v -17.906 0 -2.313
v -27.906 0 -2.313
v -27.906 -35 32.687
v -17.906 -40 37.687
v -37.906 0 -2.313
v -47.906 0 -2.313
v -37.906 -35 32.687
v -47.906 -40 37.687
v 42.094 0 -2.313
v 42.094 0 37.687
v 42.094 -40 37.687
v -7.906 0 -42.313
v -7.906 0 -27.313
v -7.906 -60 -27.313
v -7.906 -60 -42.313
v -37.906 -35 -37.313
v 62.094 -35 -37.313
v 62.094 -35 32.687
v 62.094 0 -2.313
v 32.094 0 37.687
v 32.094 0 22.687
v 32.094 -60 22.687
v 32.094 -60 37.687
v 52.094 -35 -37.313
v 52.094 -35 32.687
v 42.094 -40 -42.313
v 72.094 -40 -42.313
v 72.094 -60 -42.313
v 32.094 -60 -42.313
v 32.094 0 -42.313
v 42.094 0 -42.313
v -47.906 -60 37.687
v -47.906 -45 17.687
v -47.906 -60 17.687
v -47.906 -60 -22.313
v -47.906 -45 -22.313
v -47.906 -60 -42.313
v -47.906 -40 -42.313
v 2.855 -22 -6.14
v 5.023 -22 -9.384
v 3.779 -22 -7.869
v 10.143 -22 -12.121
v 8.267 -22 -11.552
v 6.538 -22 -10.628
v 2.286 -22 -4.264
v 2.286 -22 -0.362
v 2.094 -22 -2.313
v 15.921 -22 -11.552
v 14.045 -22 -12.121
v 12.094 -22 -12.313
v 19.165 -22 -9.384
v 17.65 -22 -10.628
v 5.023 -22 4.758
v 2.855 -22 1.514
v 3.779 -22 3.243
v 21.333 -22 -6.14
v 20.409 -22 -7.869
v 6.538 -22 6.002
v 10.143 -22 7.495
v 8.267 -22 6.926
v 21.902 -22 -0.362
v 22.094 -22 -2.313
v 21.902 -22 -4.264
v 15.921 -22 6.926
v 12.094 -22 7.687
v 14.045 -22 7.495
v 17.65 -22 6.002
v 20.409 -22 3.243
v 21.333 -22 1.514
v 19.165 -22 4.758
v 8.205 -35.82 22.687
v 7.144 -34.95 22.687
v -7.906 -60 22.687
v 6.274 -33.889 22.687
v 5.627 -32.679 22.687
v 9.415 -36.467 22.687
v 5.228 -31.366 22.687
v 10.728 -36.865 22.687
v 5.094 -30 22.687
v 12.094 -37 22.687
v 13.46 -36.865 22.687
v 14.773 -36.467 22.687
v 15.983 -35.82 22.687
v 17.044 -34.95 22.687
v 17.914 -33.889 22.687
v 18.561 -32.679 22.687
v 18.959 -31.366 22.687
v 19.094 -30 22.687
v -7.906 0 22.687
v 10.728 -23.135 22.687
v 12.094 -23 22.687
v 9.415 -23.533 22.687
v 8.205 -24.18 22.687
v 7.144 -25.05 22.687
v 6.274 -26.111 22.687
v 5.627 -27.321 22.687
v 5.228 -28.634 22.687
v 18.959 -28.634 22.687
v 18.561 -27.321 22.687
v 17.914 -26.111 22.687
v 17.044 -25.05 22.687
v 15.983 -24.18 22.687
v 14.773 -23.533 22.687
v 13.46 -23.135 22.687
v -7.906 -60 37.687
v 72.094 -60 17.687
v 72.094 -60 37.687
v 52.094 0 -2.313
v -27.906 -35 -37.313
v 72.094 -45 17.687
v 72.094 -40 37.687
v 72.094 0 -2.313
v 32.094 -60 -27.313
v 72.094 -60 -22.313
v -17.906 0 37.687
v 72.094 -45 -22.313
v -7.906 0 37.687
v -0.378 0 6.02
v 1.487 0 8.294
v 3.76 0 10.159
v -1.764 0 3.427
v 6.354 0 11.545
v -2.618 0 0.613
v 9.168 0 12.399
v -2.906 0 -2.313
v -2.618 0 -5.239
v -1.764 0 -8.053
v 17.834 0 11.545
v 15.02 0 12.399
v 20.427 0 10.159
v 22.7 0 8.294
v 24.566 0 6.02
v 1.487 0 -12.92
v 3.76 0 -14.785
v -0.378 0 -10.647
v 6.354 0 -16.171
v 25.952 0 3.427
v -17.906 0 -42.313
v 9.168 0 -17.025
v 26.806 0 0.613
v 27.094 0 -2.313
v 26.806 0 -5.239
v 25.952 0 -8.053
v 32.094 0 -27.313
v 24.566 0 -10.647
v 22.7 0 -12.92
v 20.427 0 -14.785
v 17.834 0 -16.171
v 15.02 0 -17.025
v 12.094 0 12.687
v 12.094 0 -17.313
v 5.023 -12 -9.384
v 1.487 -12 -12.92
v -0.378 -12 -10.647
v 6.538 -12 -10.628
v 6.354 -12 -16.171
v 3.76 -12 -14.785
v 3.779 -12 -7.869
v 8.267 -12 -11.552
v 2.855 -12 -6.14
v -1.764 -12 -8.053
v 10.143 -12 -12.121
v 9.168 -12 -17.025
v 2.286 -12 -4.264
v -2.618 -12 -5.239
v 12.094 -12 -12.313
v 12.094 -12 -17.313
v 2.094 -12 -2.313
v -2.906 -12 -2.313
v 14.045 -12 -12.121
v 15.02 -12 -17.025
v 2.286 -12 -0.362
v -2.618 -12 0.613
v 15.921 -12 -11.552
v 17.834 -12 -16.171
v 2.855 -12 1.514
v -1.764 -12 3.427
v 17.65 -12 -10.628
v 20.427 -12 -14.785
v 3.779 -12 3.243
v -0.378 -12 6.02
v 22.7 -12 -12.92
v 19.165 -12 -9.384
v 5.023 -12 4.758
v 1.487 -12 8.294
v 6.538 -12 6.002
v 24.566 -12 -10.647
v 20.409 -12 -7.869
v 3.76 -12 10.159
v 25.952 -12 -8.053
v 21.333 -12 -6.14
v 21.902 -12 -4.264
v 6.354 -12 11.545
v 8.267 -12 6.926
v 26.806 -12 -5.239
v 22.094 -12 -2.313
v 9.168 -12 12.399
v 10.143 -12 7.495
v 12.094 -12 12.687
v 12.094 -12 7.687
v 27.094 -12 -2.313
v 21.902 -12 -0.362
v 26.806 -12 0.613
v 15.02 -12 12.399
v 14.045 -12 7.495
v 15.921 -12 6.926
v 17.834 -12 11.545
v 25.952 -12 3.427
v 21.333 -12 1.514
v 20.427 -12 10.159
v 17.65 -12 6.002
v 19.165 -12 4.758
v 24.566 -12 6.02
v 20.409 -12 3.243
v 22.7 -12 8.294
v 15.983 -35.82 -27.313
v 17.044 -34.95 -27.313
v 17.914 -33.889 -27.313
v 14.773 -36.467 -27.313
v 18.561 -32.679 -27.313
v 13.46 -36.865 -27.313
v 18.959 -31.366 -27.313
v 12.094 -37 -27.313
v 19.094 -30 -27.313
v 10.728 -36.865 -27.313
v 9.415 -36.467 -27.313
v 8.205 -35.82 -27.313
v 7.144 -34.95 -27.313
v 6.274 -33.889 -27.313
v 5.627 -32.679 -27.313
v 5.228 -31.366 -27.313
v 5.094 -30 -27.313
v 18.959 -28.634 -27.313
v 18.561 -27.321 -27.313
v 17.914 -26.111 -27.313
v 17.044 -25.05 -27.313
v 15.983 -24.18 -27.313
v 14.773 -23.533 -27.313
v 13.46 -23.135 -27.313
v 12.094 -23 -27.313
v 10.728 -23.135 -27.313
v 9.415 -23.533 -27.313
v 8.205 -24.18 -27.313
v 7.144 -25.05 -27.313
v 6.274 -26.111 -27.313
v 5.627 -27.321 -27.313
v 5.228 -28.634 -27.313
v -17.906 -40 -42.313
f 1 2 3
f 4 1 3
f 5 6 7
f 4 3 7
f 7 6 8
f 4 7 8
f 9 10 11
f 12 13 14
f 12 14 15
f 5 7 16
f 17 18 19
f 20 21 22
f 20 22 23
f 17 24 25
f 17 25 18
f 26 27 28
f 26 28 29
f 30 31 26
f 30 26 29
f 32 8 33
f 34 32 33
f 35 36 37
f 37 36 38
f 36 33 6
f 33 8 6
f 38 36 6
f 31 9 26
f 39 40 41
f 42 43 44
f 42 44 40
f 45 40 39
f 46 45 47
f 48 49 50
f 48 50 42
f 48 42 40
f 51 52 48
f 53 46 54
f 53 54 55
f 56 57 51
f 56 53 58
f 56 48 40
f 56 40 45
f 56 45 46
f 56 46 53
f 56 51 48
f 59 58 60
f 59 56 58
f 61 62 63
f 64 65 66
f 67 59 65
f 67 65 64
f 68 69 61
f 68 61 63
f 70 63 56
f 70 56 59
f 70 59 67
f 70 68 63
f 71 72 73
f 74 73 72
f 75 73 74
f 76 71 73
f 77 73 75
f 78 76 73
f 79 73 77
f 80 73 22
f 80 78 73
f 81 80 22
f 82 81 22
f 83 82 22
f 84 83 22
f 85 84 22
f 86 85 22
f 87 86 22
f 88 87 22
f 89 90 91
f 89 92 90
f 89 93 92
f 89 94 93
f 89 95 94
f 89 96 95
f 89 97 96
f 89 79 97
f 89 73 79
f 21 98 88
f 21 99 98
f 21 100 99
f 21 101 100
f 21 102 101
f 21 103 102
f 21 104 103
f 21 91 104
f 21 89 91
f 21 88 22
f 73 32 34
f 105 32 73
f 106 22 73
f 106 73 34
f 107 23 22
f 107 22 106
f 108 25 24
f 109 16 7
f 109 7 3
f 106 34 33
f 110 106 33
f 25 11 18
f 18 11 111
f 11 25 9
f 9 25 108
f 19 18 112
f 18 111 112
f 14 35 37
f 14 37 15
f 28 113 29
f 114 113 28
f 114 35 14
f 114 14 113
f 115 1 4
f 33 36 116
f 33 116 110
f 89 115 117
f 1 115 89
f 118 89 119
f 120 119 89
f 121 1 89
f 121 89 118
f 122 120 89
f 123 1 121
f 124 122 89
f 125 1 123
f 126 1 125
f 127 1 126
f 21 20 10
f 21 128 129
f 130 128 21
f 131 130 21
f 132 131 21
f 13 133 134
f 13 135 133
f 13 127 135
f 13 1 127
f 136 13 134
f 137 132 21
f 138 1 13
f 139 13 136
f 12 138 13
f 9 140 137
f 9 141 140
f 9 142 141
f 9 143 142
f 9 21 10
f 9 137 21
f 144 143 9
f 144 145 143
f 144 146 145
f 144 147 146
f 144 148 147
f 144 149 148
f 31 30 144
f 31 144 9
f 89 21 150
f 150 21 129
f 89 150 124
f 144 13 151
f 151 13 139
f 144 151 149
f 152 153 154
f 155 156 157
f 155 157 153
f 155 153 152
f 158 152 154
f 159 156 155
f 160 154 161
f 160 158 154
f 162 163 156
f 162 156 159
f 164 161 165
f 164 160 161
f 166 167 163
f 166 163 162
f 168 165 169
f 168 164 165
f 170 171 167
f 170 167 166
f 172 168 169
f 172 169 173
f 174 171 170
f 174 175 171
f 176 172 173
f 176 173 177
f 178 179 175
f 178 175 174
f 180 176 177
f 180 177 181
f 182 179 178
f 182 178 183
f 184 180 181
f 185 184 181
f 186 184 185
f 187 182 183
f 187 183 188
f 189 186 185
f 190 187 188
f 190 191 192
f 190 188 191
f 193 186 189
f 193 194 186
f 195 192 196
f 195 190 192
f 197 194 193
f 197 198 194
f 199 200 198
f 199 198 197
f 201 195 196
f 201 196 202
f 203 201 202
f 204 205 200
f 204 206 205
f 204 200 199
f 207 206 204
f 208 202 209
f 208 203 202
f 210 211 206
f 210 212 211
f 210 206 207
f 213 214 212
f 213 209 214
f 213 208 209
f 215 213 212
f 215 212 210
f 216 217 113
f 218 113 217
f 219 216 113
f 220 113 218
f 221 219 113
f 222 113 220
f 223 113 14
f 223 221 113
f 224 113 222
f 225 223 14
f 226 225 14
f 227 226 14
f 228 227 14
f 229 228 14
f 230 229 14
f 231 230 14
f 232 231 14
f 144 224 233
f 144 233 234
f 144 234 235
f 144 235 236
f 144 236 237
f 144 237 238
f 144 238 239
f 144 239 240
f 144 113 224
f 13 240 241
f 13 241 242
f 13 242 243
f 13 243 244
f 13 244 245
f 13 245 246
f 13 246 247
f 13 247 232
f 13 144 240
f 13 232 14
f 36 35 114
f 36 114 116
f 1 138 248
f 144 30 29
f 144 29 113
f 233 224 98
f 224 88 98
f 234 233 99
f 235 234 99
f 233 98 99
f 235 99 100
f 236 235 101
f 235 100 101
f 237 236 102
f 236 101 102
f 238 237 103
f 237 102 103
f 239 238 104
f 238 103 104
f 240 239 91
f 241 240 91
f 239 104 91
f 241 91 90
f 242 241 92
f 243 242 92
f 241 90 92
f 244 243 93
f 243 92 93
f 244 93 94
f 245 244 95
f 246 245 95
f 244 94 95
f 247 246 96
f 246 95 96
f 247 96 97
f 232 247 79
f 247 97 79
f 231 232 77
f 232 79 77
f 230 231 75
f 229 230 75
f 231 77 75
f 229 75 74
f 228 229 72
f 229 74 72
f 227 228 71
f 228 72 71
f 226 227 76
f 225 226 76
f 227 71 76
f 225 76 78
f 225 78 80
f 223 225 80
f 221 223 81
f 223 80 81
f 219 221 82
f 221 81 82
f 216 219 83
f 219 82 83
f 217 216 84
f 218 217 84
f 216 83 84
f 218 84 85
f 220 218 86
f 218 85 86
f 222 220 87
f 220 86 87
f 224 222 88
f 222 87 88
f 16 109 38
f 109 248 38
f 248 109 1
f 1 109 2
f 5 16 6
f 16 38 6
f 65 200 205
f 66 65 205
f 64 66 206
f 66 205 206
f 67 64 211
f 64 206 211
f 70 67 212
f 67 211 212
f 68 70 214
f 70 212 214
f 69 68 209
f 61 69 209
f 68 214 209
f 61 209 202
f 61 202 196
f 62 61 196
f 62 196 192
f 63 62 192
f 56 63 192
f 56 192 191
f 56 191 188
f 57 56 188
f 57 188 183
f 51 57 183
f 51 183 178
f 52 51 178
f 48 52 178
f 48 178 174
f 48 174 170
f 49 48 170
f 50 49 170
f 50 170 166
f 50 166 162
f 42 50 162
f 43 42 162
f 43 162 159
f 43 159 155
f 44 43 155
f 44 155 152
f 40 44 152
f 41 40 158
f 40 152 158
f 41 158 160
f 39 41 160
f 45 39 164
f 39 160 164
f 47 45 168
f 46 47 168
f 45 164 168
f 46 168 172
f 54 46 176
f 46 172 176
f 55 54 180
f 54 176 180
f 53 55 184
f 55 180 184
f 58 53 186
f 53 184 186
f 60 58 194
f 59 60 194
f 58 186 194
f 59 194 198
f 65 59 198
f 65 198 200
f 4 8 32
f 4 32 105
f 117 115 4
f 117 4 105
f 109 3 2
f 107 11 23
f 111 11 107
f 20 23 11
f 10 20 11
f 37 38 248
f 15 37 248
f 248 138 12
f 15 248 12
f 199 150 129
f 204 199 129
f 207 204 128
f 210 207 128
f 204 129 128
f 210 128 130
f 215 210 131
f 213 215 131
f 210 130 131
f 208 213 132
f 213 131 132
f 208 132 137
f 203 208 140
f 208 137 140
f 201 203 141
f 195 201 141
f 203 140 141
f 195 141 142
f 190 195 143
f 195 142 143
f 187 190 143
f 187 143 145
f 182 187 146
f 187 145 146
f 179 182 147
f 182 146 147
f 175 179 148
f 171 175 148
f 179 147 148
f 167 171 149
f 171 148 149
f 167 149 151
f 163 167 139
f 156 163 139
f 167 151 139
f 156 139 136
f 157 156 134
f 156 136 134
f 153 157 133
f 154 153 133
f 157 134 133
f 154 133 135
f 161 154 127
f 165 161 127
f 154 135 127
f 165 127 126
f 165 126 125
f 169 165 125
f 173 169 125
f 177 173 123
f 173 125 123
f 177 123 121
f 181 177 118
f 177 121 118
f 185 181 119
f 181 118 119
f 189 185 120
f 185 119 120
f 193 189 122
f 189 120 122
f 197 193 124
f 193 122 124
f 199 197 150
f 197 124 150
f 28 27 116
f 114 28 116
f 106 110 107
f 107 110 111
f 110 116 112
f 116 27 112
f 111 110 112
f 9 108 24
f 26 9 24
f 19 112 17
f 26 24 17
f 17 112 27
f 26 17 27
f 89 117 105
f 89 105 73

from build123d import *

# Parameters (mm, degrees)
BOSS_EXTRUDE1_DEPTH = 60
SKETCH3_W           = 30
SKETCH3_H           = 20
BOSS_EXTRUDE2_DEPTH = 80
SKETCH4_W           = 40
SKETCH4_H           = 15
CUT_EXTRUDE1_DEPTH  = 141.678348685
BOSS_EXTRUDE3_DEPTH = 30
BOSS_EXTRUDE4_DEPTH = 30
SKETCH8_W           = 10
SKETCH8_H           = 35
CUT_EXTRUDE2_DEPTH  = 61
SKETCH9_W           = 10
SKETCH9_H           = 35
CUT_EXTRUDE3_DEPTH  = 61
SKETCH10_R          = 7
CUT_EXTRUDE4_DEPTH  = 61
SKETCH12_R          = 10
CUT_EXTRUDE5_DEPTH  = 12
SKETCH13_R          = 15
CUT_EXTRUDE6_DEPTH  = 12


with BuildPart() as part:
    # Sketch1 → Boss-Extrude1 (new body)
    with BuildSketch(Plane(origin=(0, 0, 0), x_dir=(1, 0, 0), z_dir=(0, 1, 0))):
        Polygon((-7.906128035, 42.313092402), (-17.906128035, 42.313092402), (-17.906128035, -37.686907598), (-7.906128035, -37.686907598), (-7.906128035, -22.686907598), (32.093871965, -22.686907598), (32.093871965, -37.686907598), (42.093871965, -37.686907598), (42.093871965, 42.313092402), (32.093871965, 42.313092402), (32.093871965, 27.313092402), (-7.906128035, 27.313092402), align=None)
    extrude(amount=-BOSS_EXTRUDE1_DEPTH)

    # Sketch3 → Boss-Extrude2 (add)
    with BuildSketch(Plane.XY.offset(37.686907598)):
        with Locations((-32.906128035, -50)):
            Rectangle(SKETCH3_W, SKETCH3_H)
        with Locations((57.093871965, -50)):
            Rectangle(SKETCH3_W, SKETCH3_H)
    extrude(amount=-BOSS_EXTRUDE2_DEPTH)

    # Sketch4 → Cut-Extrude1 (cut, through all)
    with BuildSketch(Plane.ZY.offset(47.906128035)):
        with Locations((-2.313092402, -52.5)):
            Rectangle(SKETCH4_W, SKETCH4_H)
    extrude(amount=-CUT_EXTRUDE1_DEPTH, mode=Mode.SUBTRACT)

    # Sketch5 → Boss-Extrude3 (add)
    with BuildSketch(Plane.ZY.offset(47.906128035)):
        Polygon((-42.313092402, -40), (-2.313092402, 0), (37.686907598, -40), align=None)
    extrude(amount=-BOSS_EXTRUDE3_DEPTH)

    # Sketch6 → Boss-Extrude4 (add)
    with BuildSketch(Plane(origin=(72.093871965, 0, 0), x_dir=(0, 0, -1), z_dir=(1, 0, 0))):
        Polygon((-37.686907598, -40), (2.313092402, 0), (42.313092402, -40), align=None)
    extrude(amount=-BOSS_EXTRUDE4_DEPTH)

    # Sketch8 → Cut-Extrude2 (cut, symmetric)
    with BuildSketch(Plane.XY.offset(-2.313092402)):
        with Locations((-32.906128035, -17.5)):
            Rectangle(SKETCH8_W, SKETCH8_H)
    extrude(amount=CUT_EXTRUDE2_DEPTH, both=True, mode=Mode.SUBTRACT)

    # Sketch9 → Cut-Extrude3 (cut, symmetric)
    with BuildSketch(Plane.XY.offset(-2.313092402)):
        with Locations((57.093871965, -17.5)):
            Rectangle(SKETCH9_W, SKETCH9_H)
    extrude(amount=CUT_EXTRUDE3_DEPTH, both=True, mode=Mode.SUBTRACT)

    # Sketch10 → Cut-Extrude4 (cut, symmetric)
    with BuildSketch(Plane.XY.offset(22.686907598)):
        with Locations((12.093871965, -30)):
            Circle(SKETCH10_R)
    extrude(amount=CUT_EXTRUDE4_DEPTH, both=True, mode=Mode.SUBTRACT)

    # Sketch12 → Cut-Extrude5 (cut)
    with BuildSketch(Plane(origin=(0, -10, 0), x_dir=(1, 0, 0), z_dir=(0, 1, 0))):
        with Locations(Location((12.093871965, 2.313092402, 0), (0, 0, 270))):
            Circle(SKETCH12_R)
    extrude(amount=-CUT_EXTRUDE5_DEPTH, mode=Mode.SUBTRACT)

    # Sketch13 → Cut-Extrude6 (cut)
    with BuildSketch(Plane(origin=(0, 0, 0), x_dir=(1, 0, 0), z_dir=(0, 1, 0))):
        with Locations(Location((12.093871965, 2.313092402, 0), (0, 0, 270))):
            Circle(SKETCH13_R)
    extrude(amount=-CUT_EXTRUDE6_DEPTH, mode=Mode.SUBTRACT)


solid = part.part
